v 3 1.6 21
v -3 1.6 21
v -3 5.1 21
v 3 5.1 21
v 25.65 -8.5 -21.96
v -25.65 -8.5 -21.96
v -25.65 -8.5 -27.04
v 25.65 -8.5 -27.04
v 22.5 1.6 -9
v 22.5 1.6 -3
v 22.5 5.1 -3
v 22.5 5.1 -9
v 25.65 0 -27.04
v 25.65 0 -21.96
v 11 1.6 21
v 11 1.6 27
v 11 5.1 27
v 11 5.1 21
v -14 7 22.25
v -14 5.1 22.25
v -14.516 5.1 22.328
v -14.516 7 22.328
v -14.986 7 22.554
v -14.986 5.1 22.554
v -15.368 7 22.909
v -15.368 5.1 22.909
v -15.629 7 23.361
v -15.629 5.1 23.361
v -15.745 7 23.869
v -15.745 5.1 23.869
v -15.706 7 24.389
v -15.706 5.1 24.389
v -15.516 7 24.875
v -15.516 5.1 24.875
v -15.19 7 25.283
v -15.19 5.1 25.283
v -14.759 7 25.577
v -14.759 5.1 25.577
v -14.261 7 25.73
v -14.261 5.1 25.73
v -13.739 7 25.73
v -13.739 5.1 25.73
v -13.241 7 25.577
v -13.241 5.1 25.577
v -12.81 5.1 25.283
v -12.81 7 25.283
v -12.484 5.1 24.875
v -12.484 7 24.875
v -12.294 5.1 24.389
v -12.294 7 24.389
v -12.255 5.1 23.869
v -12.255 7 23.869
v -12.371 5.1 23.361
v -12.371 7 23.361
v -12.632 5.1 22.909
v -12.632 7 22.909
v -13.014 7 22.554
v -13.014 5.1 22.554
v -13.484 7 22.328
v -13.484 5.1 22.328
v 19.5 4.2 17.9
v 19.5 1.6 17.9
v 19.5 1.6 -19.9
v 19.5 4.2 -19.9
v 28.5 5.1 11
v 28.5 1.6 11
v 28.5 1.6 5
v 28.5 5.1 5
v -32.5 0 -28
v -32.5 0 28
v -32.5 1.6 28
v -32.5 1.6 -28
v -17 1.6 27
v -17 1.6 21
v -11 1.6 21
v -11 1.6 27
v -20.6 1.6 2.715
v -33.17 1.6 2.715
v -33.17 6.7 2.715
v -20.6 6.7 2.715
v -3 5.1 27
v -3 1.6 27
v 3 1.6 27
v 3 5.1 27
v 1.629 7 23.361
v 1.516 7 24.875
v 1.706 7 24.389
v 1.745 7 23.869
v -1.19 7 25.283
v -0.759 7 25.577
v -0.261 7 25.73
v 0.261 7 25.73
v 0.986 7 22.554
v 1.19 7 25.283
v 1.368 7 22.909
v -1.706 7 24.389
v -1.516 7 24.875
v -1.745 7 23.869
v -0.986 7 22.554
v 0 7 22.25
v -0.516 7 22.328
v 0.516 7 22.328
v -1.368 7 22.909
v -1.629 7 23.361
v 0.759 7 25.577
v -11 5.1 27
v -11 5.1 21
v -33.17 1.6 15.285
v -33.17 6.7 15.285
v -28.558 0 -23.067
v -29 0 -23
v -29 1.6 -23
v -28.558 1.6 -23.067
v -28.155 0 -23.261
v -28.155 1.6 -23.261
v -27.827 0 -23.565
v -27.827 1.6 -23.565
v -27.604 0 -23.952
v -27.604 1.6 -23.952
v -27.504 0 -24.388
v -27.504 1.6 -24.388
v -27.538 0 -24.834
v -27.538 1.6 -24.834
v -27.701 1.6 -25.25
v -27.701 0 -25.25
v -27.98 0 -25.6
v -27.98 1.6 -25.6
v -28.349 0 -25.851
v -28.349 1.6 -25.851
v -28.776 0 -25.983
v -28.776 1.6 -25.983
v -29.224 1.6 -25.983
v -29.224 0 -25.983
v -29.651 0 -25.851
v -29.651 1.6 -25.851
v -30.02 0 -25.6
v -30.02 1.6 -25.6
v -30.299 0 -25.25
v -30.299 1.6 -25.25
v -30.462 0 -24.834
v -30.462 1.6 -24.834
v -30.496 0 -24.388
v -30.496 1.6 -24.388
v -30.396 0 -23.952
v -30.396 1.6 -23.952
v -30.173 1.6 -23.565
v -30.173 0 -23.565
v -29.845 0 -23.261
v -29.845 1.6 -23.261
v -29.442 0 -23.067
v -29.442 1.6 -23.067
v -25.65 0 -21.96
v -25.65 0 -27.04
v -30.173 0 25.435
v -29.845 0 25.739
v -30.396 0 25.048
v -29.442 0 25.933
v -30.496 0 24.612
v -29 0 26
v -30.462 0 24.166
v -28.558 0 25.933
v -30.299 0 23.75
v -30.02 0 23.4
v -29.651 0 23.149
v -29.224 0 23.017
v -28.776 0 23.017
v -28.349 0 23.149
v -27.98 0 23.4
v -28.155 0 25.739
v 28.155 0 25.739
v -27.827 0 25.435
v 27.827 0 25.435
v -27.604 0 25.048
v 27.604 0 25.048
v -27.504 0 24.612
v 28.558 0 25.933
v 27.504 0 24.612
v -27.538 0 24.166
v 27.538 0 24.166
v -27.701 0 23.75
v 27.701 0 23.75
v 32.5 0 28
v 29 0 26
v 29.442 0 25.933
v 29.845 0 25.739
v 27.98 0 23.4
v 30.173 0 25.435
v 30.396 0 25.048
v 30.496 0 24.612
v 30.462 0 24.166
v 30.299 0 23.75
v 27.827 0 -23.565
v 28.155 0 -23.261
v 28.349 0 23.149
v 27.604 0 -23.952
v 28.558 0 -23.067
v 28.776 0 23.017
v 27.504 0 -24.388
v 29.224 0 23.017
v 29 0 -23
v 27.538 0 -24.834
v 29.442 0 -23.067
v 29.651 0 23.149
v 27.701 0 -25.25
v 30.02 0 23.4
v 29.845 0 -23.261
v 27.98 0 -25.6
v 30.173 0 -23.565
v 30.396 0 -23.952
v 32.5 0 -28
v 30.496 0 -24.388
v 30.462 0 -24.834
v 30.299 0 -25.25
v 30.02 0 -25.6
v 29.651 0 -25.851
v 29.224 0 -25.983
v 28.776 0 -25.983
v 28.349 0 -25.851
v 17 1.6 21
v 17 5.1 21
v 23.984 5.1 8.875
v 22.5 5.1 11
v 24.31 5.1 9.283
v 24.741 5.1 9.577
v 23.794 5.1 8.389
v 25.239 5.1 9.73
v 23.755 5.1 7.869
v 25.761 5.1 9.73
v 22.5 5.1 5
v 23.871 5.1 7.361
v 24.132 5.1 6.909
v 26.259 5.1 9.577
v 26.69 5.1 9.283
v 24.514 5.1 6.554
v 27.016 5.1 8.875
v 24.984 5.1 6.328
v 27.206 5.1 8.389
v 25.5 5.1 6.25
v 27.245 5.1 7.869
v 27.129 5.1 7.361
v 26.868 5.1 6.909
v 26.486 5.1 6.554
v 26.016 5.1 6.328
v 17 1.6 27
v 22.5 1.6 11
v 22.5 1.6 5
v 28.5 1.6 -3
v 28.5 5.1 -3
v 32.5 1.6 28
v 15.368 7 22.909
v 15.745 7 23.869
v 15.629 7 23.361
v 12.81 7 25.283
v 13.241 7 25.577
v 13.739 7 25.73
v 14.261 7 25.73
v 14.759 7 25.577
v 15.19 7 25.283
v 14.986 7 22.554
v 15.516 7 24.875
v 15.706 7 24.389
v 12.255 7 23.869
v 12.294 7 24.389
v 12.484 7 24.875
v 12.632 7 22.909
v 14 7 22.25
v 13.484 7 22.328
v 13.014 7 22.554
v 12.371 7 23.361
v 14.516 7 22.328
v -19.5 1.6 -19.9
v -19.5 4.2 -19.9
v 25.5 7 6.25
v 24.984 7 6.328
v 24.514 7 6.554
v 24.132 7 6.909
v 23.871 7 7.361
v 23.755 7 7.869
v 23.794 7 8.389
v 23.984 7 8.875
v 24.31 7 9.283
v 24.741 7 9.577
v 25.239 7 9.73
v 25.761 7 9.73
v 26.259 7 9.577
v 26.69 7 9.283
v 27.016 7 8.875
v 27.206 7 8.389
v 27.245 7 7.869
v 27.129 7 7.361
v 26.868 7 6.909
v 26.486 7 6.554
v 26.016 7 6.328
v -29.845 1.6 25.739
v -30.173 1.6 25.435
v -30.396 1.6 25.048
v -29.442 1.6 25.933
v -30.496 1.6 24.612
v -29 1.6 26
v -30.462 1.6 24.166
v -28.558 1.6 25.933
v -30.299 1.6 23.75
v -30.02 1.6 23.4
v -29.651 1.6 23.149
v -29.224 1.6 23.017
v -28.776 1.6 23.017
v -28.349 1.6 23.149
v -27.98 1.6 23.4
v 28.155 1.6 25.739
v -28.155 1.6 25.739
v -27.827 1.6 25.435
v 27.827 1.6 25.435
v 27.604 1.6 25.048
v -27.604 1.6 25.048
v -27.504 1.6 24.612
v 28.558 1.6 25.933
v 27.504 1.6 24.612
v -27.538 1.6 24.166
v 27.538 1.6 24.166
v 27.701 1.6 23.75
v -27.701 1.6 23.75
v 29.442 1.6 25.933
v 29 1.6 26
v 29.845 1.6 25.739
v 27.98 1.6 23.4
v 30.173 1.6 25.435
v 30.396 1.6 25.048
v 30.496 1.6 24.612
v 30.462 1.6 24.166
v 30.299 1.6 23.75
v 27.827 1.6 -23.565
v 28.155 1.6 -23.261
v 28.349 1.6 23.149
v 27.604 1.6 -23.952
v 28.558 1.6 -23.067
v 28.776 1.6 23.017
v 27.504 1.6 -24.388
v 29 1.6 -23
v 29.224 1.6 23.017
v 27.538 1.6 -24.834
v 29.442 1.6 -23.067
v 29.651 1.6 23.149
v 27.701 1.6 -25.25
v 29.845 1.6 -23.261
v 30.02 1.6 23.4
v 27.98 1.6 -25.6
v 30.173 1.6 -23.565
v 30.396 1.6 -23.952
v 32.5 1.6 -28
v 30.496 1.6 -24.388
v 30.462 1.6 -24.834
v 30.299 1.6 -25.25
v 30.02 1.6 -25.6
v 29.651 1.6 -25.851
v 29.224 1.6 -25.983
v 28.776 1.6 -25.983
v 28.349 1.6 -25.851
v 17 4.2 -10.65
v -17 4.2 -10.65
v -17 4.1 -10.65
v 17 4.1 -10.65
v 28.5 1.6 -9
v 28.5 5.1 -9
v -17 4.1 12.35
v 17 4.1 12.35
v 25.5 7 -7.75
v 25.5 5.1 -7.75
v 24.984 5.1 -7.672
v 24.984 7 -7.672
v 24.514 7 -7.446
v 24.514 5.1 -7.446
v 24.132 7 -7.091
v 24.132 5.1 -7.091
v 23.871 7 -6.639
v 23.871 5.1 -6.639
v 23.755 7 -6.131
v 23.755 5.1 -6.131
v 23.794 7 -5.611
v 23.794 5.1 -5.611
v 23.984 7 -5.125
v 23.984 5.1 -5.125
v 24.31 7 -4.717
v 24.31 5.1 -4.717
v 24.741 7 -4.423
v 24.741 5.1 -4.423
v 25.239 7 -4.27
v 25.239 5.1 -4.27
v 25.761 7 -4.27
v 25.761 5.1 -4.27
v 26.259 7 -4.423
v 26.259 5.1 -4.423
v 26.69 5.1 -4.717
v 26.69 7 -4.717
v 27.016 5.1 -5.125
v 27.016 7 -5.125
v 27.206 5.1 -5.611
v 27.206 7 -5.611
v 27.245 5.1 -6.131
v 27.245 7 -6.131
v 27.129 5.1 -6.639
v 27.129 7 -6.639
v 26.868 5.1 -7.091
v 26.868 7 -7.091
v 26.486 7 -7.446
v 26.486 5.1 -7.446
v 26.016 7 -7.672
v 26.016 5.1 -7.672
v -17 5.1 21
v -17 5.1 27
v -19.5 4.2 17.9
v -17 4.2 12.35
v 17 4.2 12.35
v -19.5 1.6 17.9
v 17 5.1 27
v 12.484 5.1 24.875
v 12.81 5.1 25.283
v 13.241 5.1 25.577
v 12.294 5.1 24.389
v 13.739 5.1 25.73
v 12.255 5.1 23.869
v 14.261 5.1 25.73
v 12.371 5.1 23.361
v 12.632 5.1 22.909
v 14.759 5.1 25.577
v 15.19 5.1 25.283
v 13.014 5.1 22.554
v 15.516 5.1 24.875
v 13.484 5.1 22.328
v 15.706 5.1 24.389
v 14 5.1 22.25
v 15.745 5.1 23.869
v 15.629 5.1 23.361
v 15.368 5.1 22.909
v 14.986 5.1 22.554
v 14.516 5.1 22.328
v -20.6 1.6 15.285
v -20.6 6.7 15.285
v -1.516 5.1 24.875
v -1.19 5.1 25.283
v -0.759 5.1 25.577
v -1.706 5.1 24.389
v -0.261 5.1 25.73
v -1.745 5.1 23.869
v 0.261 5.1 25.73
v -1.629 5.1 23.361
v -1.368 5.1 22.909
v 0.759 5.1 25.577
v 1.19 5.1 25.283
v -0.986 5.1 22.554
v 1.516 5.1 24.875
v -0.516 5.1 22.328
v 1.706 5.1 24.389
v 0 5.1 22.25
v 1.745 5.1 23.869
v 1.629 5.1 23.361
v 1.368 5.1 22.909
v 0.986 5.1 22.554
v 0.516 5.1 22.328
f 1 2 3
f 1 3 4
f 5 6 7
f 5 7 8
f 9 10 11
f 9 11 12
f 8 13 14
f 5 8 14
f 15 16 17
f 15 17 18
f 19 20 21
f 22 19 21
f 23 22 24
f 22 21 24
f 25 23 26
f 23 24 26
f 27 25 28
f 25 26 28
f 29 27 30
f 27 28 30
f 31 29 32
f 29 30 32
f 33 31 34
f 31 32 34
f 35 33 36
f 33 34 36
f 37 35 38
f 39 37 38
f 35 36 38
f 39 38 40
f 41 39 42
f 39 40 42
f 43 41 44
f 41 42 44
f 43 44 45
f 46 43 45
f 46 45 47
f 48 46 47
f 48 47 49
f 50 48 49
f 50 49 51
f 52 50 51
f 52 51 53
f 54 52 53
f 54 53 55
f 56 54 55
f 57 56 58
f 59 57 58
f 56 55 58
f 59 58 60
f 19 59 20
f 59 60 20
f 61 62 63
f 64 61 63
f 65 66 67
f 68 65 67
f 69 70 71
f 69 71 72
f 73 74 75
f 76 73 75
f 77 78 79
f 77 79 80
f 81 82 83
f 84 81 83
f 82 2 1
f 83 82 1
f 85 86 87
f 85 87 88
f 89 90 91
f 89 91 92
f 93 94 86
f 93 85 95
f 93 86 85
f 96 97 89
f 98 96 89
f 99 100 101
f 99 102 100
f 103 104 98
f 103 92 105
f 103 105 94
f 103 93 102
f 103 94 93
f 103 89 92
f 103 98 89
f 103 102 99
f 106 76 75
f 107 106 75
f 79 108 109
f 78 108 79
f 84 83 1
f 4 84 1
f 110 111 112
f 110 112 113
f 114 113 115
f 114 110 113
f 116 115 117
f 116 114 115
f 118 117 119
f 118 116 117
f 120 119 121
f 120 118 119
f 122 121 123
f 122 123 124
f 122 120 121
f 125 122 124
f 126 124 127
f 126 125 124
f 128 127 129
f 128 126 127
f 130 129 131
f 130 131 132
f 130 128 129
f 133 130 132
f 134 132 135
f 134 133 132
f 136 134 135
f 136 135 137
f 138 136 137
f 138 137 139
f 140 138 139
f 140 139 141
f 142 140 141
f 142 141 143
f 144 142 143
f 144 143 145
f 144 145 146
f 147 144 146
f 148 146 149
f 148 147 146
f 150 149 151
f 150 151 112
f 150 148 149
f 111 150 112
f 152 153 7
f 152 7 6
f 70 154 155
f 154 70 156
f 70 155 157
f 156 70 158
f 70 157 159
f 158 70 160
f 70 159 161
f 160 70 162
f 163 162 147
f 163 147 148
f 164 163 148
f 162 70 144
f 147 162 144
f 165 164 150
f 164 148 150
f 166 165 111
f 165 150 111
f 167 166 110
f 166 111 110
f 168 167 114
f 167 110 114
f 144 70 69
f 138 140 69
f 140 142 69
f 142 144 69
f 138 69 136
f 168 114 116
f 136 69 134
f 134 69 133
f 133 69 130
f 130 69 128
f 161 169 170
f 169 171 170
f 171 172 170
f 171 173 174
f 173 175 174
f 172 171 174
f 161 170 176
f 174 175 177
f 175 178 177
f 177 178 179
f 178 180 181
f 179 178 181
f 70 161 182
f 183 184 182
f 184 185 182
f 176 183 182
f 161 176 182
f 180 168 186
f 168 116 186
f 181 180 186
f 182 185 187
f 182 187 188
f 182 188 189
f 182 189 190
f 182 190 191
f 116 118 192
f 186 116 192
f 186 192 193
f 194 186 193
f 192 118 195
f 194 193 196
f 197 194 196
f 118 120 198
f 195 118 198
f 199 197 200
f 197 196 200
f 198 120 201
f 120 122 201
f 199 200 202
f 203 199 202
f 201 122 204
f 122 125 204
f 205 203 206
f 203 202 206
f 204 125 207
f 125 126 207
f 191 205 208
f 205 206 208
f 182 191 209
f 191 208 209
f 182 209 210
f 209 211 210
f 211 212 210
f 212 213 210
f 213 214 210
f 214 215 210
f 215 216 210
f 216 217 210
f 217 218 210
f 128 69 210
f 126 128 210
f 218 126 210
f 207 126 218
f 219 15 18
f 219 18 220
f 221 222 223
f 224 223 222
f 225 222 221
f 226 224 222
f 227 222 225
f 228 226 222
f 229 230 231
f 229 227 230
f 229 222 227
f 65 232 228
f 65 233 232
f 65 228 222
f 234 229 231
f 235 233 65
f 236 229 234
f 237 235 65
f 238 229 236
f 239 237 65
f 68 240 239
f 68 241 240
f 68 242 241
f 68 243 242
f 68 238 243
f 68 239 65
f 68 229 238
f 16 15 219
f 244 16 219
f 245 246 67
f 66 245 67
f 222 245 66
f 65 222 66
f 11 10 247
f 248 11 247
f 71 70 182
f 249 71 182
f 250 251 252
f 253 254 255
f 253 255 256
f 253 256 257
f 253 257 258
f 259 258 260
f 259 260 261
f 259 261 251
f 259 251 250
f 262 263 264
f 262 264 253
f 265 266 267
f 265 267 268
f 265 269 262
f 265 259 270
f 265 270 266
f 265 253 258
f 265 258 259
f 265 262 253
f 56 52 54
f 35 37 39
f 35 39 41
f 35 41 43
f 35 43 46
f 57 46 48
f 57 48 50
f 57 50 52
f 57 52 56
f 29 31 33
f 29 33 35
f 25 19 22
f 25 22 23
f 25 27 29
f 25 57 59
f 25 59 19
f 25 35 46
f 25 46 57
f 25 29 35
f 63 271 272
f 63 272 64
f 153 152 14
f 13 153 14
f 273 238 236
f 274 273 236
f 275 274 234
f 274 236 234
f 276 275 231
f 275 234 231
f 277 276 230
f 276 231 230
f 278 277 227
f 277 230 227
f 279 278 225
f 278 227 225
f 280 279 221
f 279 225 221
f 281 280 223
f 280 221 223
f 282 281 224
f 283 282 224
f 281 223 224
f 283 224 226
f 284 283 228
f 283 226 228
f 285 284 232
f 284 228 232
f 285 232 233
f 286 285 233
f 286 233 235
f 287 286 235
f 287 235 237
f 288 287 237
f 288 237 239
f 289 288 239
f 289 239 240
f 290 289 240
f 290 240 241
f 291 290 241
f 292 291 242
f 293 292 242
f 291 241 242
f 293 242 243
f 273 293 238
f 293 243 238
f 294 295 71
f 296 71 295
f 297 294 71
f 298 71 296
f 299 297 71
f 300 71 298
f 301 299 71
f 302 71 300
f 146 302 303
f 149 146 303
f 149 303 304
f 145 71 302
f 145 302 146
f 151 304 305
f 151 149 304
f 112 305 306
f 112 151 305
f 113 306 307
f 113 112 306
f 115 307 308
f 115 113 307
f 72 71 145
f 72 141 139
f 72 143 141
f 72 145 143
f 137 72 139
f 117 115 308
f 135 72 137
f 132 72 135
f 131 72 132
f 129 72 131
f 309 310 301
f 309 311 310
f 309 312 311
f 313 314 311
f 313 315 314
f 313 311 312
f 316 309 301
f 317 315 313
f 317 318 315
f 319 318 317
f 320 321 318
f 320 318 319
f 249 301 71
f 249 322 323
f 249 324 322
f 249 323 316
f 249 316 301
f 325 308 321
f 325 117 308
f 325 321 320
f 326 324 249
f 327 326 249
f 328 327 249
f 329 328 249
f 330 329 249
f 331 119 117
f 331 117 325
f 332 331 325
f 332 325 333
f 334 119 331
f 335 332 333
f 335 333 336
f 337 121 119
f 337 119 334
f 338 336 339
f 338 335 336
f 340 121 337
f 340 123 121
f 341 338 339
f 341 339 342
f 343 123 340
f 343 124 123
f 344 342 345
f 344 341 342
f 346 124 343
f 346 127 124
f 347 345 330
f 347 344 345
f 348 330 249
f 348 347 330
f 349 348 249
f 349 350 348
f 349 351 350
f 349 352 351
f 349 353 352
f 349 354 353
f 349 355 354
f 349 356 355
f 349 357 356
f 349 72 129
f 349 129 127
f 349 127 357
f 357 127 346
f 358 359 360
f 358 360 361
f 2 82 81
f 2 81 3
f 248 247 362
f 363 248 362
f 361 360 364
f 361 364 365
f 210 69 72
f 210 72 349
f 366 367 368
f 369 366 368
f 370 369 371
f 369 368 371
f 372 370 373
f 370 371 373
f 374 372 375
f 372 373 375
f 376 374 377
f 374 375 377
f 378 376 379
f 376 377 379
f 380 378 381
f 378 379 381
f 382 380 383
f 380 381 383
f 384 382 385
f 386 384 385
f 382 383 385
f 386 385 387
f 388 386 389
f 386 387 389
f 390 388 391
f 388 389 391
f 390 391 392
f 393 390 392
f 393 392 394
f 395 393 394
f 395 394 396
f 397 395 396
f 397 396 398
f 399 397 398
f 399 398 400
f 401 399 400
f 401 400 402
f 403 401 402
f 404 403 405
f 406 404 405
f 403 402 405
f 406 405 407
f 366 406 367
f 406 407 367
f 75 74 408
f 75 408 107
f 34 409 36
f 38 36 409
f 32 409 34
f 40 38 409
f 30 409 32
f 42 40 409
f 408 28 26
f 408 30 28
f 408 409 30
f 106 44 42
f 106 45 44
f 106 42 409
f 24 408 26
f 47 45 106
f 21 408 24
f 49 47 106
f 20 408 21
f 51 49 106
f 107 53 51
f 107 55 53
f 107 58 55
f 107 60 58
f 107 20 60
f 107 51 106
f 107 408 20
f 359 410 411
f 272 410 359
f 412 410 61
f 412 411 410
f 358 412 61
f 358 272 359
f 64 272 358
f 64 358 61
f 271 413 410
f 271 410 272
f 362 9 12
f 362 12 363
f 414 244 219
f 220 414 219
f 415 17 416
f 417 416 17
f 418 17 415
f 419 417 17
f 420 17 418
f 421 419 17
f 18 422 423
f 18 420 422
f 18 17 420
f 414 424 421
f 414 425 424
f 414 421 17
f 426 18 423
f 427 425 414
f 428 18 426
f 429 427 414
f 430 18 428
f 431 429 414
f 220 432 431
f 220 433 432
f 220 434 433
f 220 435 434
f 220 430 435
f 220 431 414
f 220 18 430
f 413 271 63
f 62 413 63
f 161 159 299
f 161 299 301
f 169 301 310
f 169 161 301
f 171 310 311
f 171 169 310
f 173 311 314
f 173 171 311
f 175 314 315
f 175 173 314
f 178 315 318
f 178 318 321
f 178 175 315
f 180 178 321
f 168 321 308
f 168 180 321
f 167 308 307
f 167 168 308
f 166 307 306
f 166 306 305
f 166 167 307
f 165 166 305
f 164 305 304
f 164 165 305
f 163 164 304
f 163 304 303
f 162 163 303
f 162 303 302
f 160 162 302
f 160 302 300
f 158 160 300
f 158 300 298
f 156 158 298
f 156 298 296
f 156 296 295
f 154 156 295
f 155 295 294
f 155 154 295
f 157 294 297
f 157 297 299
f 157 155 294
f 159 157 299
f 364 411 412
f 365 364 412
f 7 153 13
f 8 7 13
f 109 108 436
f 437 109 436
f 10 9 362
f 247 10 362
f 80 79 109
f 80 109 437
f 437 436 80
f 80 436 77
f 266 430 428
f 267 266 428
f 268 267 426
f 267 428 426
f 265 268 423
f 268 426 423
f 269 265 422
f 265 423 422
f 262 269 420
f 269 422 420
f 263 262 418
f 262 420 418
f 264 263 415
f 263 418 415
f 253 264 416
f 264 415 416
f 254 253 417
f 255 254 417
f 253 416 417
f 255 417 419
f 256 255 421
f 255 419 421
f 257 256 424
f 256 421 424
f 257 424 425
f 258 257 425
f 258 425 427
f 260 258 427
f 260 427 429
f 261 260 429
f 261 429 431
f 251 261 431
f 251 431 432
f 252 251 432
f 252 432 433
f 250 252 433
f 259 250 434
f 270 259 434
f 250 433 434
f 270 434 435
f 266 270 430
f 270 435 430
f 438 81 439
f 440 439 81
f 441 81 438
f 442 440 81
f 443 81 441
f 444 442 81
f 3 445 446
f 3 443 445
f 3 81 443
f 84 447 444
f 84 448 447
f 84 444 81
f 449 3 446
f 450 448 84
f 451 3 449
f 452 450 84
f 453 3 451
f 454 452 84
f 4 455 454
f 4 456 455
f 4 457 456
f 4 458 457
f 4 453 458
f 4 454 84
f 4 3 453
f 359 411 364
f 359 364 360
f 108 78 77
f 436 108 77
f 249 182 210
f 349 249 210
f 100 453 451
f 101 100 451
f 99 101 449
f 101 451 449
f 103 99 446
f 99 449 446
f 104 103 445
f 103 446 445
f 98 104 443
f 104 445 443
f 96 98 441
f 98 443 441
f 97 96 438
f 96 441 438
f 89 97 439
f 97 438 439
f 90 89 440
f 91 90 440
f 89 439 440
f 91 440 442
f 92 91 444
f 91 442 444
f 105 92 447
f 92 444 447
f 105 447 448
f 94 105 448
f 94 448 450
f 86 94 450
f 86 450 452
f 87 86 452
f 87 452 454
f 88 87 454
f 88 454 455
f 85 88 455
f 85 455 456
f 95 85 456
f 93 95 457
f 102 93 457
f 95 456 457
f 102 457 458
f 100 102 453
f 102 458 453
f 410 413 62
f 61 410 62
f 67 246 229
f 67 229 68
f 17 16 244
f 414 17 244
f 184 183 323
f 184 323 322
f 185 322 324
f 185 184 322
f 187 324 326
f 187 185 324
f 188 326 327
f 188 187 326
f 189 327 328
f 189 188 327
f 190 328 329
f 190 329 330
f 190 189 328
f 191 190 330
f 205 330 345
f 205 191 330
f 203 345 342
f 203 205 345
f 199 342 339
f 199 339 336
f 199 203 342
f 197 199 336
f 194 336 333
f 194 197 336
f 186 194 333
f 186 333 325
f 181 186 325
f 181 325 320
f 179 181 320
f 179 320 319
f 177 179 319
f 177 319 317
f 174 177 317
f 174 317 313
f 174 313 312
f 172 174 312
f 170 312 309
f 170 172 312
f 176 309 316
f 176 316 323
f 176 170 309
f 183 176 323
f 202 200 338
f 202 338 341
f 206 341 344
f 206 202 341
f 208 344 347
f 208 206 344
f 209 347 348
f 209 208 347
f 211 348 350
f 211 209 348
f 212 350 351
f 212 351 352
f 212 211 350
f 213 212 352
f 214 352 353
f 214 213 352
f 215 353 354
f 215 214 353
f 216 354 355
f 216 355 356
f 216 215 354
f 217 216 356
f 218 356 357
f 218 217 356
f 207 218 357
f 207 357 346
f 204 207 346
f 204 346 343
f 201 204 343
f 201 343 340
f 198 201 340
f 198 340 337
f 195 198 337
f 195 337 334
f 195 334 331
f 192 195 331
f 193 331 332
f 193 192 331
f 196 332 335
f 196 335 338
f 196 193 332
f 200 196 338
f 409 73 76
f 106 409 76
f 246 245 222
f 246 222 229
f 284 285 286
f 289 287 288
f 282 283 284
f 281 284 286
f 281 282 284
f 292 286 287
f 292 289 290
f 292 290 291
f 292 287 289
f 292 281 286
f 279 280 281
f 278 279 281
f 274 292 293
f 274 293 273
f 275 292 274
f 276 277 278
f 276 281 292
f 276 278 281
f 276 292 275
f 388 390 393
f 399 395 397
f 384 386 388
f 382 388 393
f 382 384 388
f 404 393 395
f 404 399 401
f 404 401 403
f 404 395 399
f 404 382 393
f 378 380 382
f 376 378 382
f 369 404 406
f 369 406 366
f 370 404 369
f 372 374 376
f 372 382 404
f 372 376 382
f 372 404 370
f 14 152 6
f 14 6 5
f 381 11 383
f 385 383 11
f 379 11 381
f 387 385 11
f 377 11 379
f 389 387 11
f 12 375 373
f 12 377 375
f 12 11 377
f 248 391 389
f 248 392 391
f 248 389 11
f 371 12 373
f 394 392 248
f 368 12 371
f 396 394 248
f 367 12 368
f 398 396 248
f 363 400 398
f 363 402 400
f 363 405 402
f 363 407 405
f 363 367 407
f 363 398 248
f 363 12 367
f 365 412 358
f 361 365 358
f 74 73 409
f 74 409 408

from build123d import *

# Parameters (mm, degrees)
SKETCH1_W             = 65
SKETCH1_H             = 56
SKETCH1_R             = 1.5
BOSS_EXTRUDE1_DEPTH   = 1.6
SKETCH2_W             = 39
SKETCH2_H             = 37.8
BOSS_EXTRUDE2_DEPTH   = 2.6
SKETCH3_W             = 34
SKETCH3_H             = 23
CUT_EXTRUDE1_DEPTH    = 0.1
SKETCH4_W             = 12.57
SKETCH4_H             = 12.57
BOSS_EXTRUDE3_DEPTH   = 5.1
SKETCH5_W             = 6
SKETCH5_H             = 6
BOSS_EXTRUDE4_DEPTH   = 3.5
BOSS_EXTRUDE4_2_DEPTH = 3.5
BOSS_EXTRUDE4_3_DEPTH = 3.5
BOSS_EXTRUDE4_4_DEPTH = 3.5
BOSS_EXTRUDE4_5_DEPTH = 3.5
SKETCH6_R             = 1.75
BOSS_EXTRUDE5_DEPTH   = 1.9
SKETCH7_W             = 51.3
SKETCH7_H             = 5.08
BOSS_EXTRUDE6_DEPTH   = 8.5


with BuildPart() as part:
    # Sketch1 → Boss-Extrude1 (new body)
    with BuildSketch(Plane(origin=(0, 0, 0), x_dir=(1, 0, 0), z_dir=(0, 1, 0))):
        Rectangle(SKETCH1_W, SKETCH1_H)
        with Locations(Location((-29, 24.5, 0), (0, 0, 270))):
            Circle(SKETCH1_R, mode=Mode.SUBTRACT)
        with Locations(Location((29, 24.5, 0), (0, 0, 270))):
            Circle(SKETCH1_R, mode=Mode.SUBTRACT)
        with Locations(Location((29, -24.5, 0), (0, 0, 270))):
            Circle(SKETCH1_R, mode=Mode.SUBTRACT)
        with Locations(Location((-29, -24.5, 0), (0, 0, 270))):
            Circle(SKETCH1_R, mode=Mode.SUBTRACT)
    extrude(amount=BOSS_EXTRUDE1_DEPTH)


with BuildPart() as body_2:
    # Sketch2 → Boss-Extrude2 (new body)
    with BuildSketch(Plane(origin=(0, 1.6, 0), x_dir=(1, 0, 0), z_dir=(0, 1, 0))):
        with Locations((0, 1)):
            Rectangle(SKETCH2_W, SKETCH2_H)
    extrude(amount=BOSS_EXTRUDE2_DEPTH)

    # Sketch3 → Cut-Extrude1 (cut)
    with BuildSketch(Plane(origin=(0, 4.2, 0), x_dir=(1, 0, 0), z_dir=(0, 1, 0))):
        with Locations((0, -0.85)):
            Rectangle(SKETCH3_W, SKETCH3_H)
    extrude(amount=-CUT_EXTRUDE1_DEPTH, mode=Mode.SUBTRACT)


with BuildPart() as body_3:
    # Sketch4 → Boss-Extrude3 (new body)
    with BuildSketch(Plane(origin=(0, 1.6, 0), x_dir=(1, 0, 0), z_dir=(0, 1, 0))):
        with Locations((-26.885, -9)):
            Rectangle(SKETCH4_W, SKETCH4_H)
    extrude(amount=BOSS_EXTRUDE3_DEPTH)


with BuildPart() as body_4:
    # Sketch5 → Boss-Extrude4 (new body)
    with BuildSketch(Plane(origin=(0, 1.6, 0), x_dir=(1, 0, 0), z_dir=(0, 1, 0))):
        with Locations((0, -24)):
            Rectangle(SKETCH5_W, SKETCH5_H)
    extrude(amount=BOSS_EXTRUDE4_DEPTH)



with BuildPart() as body_5:
    # Sketch5 → Boss-Extrude4 2 (new body)
    with BuildSketch(Plane(origin=(0, 1.6, 0), x_dir=(1, 0, 0), z_dir=(0, 1, 0))):
        with Locations((14, -24)):
            Rectangle(SKETCH5_W, SKETCH5_H)
    extrude(amount=BOSS_EXTRUDE4_2_DEPTH)


with BuildPart() as body_6:
    # Sketch5 → Boss-Extrude4 3 (new body)
    with BuildSketch(Plane(origin=(0, 1.6, 0), x_dir=(1, 0, 0), z_dir=(0, 1, 0))):
        with Locations((-14, -24)):
            Rectangle(SKETCH5_W, SKETCH5_H)
    extrude(amount=BOSS_EXTRUDE4_3_DEPTH)


with BuildPart() as body_7:
    # Sketch5 → Boss-Extrude4 4 (new body)
    with BuildSketch(Plane(origin=(0, 1.6, 0), x_dir=(1, 0, 0), z_dir=(0, 1, 0))):
        with Locations((25.5, 6)):
            Rectangle(SKETCH5_W, SKETCH5_H)
    extrude(amount=BOSS_EXTRUDE4_4_DEPTH)


with BuildPart() as body_8:
    # Sketch5 → Boss-Extrude4 5 (new body)
    with BuildSketch(Plane(origin=(0, 1.6, 0), x_dir=(1, 0, 0), z_dir=(0, 1, 0))):
        with Locations((25.5, -8)):
            Rectangle(SKETCH5_W, SKETCH5_H)
    extrude(amount=BOSS_EXTRUDE4_5_DEPTH)


with BuildPart() as body_4_1:
    add(body_4.part)

    add(body_5.part)  # Boss-Extrude5 merges body 5

    add(body_6.part)  # Boss-Extrude5 merges body 6

    add(body_7.part)  # Boss-Extrude5 merges body 7

    add(body_8.part)  # Boss-Extrude5 merges body 8
    # Sketch6 → Boss-Extrude5 (add)
    with BuildSketch(Plane(origin=(0, 5.1, 0), x_dir=(1, 0, 0), z_dir=(0, 1, 0))):
        with Locations(Location((-14, -24, 0), (0, 0, 90))):
            Circle(SKETCH6_R)
        with Locations(Location((0, -24, 0), (0, 0, 90))):
            Circle(SKETCH6_R)
        with Locations(Location((14, -24, 0), (0, 0, 90))):
            Circle(SKETCH6_R)
        with Locations(Location((25.5, -8, 0), (0, 0, 90))):
            Circle(SKETCH6_R)
        with Locations(Location((25.5, 6, 0), (0, 0, 90))):
            Circle(SKETCH6_R)
    extrude(amount=BOSS_EXTRUDE5_DEPTH)


with BuildPart() as body_5_2:
    # Sketch7 → Boss-Extrude6 (new body)
    with BuildSketch(Plane.XZ):
        with Locations((0, -24.5)):
            Rectangle(SKETCH7_W, SKETCH7_H)
    extrude(amount=BOSS_EXTRUDE6_DEPTH)


solid = Compound([part.part, body_2.part, body_3.part, body_4_1.part, body_5_2.part])
